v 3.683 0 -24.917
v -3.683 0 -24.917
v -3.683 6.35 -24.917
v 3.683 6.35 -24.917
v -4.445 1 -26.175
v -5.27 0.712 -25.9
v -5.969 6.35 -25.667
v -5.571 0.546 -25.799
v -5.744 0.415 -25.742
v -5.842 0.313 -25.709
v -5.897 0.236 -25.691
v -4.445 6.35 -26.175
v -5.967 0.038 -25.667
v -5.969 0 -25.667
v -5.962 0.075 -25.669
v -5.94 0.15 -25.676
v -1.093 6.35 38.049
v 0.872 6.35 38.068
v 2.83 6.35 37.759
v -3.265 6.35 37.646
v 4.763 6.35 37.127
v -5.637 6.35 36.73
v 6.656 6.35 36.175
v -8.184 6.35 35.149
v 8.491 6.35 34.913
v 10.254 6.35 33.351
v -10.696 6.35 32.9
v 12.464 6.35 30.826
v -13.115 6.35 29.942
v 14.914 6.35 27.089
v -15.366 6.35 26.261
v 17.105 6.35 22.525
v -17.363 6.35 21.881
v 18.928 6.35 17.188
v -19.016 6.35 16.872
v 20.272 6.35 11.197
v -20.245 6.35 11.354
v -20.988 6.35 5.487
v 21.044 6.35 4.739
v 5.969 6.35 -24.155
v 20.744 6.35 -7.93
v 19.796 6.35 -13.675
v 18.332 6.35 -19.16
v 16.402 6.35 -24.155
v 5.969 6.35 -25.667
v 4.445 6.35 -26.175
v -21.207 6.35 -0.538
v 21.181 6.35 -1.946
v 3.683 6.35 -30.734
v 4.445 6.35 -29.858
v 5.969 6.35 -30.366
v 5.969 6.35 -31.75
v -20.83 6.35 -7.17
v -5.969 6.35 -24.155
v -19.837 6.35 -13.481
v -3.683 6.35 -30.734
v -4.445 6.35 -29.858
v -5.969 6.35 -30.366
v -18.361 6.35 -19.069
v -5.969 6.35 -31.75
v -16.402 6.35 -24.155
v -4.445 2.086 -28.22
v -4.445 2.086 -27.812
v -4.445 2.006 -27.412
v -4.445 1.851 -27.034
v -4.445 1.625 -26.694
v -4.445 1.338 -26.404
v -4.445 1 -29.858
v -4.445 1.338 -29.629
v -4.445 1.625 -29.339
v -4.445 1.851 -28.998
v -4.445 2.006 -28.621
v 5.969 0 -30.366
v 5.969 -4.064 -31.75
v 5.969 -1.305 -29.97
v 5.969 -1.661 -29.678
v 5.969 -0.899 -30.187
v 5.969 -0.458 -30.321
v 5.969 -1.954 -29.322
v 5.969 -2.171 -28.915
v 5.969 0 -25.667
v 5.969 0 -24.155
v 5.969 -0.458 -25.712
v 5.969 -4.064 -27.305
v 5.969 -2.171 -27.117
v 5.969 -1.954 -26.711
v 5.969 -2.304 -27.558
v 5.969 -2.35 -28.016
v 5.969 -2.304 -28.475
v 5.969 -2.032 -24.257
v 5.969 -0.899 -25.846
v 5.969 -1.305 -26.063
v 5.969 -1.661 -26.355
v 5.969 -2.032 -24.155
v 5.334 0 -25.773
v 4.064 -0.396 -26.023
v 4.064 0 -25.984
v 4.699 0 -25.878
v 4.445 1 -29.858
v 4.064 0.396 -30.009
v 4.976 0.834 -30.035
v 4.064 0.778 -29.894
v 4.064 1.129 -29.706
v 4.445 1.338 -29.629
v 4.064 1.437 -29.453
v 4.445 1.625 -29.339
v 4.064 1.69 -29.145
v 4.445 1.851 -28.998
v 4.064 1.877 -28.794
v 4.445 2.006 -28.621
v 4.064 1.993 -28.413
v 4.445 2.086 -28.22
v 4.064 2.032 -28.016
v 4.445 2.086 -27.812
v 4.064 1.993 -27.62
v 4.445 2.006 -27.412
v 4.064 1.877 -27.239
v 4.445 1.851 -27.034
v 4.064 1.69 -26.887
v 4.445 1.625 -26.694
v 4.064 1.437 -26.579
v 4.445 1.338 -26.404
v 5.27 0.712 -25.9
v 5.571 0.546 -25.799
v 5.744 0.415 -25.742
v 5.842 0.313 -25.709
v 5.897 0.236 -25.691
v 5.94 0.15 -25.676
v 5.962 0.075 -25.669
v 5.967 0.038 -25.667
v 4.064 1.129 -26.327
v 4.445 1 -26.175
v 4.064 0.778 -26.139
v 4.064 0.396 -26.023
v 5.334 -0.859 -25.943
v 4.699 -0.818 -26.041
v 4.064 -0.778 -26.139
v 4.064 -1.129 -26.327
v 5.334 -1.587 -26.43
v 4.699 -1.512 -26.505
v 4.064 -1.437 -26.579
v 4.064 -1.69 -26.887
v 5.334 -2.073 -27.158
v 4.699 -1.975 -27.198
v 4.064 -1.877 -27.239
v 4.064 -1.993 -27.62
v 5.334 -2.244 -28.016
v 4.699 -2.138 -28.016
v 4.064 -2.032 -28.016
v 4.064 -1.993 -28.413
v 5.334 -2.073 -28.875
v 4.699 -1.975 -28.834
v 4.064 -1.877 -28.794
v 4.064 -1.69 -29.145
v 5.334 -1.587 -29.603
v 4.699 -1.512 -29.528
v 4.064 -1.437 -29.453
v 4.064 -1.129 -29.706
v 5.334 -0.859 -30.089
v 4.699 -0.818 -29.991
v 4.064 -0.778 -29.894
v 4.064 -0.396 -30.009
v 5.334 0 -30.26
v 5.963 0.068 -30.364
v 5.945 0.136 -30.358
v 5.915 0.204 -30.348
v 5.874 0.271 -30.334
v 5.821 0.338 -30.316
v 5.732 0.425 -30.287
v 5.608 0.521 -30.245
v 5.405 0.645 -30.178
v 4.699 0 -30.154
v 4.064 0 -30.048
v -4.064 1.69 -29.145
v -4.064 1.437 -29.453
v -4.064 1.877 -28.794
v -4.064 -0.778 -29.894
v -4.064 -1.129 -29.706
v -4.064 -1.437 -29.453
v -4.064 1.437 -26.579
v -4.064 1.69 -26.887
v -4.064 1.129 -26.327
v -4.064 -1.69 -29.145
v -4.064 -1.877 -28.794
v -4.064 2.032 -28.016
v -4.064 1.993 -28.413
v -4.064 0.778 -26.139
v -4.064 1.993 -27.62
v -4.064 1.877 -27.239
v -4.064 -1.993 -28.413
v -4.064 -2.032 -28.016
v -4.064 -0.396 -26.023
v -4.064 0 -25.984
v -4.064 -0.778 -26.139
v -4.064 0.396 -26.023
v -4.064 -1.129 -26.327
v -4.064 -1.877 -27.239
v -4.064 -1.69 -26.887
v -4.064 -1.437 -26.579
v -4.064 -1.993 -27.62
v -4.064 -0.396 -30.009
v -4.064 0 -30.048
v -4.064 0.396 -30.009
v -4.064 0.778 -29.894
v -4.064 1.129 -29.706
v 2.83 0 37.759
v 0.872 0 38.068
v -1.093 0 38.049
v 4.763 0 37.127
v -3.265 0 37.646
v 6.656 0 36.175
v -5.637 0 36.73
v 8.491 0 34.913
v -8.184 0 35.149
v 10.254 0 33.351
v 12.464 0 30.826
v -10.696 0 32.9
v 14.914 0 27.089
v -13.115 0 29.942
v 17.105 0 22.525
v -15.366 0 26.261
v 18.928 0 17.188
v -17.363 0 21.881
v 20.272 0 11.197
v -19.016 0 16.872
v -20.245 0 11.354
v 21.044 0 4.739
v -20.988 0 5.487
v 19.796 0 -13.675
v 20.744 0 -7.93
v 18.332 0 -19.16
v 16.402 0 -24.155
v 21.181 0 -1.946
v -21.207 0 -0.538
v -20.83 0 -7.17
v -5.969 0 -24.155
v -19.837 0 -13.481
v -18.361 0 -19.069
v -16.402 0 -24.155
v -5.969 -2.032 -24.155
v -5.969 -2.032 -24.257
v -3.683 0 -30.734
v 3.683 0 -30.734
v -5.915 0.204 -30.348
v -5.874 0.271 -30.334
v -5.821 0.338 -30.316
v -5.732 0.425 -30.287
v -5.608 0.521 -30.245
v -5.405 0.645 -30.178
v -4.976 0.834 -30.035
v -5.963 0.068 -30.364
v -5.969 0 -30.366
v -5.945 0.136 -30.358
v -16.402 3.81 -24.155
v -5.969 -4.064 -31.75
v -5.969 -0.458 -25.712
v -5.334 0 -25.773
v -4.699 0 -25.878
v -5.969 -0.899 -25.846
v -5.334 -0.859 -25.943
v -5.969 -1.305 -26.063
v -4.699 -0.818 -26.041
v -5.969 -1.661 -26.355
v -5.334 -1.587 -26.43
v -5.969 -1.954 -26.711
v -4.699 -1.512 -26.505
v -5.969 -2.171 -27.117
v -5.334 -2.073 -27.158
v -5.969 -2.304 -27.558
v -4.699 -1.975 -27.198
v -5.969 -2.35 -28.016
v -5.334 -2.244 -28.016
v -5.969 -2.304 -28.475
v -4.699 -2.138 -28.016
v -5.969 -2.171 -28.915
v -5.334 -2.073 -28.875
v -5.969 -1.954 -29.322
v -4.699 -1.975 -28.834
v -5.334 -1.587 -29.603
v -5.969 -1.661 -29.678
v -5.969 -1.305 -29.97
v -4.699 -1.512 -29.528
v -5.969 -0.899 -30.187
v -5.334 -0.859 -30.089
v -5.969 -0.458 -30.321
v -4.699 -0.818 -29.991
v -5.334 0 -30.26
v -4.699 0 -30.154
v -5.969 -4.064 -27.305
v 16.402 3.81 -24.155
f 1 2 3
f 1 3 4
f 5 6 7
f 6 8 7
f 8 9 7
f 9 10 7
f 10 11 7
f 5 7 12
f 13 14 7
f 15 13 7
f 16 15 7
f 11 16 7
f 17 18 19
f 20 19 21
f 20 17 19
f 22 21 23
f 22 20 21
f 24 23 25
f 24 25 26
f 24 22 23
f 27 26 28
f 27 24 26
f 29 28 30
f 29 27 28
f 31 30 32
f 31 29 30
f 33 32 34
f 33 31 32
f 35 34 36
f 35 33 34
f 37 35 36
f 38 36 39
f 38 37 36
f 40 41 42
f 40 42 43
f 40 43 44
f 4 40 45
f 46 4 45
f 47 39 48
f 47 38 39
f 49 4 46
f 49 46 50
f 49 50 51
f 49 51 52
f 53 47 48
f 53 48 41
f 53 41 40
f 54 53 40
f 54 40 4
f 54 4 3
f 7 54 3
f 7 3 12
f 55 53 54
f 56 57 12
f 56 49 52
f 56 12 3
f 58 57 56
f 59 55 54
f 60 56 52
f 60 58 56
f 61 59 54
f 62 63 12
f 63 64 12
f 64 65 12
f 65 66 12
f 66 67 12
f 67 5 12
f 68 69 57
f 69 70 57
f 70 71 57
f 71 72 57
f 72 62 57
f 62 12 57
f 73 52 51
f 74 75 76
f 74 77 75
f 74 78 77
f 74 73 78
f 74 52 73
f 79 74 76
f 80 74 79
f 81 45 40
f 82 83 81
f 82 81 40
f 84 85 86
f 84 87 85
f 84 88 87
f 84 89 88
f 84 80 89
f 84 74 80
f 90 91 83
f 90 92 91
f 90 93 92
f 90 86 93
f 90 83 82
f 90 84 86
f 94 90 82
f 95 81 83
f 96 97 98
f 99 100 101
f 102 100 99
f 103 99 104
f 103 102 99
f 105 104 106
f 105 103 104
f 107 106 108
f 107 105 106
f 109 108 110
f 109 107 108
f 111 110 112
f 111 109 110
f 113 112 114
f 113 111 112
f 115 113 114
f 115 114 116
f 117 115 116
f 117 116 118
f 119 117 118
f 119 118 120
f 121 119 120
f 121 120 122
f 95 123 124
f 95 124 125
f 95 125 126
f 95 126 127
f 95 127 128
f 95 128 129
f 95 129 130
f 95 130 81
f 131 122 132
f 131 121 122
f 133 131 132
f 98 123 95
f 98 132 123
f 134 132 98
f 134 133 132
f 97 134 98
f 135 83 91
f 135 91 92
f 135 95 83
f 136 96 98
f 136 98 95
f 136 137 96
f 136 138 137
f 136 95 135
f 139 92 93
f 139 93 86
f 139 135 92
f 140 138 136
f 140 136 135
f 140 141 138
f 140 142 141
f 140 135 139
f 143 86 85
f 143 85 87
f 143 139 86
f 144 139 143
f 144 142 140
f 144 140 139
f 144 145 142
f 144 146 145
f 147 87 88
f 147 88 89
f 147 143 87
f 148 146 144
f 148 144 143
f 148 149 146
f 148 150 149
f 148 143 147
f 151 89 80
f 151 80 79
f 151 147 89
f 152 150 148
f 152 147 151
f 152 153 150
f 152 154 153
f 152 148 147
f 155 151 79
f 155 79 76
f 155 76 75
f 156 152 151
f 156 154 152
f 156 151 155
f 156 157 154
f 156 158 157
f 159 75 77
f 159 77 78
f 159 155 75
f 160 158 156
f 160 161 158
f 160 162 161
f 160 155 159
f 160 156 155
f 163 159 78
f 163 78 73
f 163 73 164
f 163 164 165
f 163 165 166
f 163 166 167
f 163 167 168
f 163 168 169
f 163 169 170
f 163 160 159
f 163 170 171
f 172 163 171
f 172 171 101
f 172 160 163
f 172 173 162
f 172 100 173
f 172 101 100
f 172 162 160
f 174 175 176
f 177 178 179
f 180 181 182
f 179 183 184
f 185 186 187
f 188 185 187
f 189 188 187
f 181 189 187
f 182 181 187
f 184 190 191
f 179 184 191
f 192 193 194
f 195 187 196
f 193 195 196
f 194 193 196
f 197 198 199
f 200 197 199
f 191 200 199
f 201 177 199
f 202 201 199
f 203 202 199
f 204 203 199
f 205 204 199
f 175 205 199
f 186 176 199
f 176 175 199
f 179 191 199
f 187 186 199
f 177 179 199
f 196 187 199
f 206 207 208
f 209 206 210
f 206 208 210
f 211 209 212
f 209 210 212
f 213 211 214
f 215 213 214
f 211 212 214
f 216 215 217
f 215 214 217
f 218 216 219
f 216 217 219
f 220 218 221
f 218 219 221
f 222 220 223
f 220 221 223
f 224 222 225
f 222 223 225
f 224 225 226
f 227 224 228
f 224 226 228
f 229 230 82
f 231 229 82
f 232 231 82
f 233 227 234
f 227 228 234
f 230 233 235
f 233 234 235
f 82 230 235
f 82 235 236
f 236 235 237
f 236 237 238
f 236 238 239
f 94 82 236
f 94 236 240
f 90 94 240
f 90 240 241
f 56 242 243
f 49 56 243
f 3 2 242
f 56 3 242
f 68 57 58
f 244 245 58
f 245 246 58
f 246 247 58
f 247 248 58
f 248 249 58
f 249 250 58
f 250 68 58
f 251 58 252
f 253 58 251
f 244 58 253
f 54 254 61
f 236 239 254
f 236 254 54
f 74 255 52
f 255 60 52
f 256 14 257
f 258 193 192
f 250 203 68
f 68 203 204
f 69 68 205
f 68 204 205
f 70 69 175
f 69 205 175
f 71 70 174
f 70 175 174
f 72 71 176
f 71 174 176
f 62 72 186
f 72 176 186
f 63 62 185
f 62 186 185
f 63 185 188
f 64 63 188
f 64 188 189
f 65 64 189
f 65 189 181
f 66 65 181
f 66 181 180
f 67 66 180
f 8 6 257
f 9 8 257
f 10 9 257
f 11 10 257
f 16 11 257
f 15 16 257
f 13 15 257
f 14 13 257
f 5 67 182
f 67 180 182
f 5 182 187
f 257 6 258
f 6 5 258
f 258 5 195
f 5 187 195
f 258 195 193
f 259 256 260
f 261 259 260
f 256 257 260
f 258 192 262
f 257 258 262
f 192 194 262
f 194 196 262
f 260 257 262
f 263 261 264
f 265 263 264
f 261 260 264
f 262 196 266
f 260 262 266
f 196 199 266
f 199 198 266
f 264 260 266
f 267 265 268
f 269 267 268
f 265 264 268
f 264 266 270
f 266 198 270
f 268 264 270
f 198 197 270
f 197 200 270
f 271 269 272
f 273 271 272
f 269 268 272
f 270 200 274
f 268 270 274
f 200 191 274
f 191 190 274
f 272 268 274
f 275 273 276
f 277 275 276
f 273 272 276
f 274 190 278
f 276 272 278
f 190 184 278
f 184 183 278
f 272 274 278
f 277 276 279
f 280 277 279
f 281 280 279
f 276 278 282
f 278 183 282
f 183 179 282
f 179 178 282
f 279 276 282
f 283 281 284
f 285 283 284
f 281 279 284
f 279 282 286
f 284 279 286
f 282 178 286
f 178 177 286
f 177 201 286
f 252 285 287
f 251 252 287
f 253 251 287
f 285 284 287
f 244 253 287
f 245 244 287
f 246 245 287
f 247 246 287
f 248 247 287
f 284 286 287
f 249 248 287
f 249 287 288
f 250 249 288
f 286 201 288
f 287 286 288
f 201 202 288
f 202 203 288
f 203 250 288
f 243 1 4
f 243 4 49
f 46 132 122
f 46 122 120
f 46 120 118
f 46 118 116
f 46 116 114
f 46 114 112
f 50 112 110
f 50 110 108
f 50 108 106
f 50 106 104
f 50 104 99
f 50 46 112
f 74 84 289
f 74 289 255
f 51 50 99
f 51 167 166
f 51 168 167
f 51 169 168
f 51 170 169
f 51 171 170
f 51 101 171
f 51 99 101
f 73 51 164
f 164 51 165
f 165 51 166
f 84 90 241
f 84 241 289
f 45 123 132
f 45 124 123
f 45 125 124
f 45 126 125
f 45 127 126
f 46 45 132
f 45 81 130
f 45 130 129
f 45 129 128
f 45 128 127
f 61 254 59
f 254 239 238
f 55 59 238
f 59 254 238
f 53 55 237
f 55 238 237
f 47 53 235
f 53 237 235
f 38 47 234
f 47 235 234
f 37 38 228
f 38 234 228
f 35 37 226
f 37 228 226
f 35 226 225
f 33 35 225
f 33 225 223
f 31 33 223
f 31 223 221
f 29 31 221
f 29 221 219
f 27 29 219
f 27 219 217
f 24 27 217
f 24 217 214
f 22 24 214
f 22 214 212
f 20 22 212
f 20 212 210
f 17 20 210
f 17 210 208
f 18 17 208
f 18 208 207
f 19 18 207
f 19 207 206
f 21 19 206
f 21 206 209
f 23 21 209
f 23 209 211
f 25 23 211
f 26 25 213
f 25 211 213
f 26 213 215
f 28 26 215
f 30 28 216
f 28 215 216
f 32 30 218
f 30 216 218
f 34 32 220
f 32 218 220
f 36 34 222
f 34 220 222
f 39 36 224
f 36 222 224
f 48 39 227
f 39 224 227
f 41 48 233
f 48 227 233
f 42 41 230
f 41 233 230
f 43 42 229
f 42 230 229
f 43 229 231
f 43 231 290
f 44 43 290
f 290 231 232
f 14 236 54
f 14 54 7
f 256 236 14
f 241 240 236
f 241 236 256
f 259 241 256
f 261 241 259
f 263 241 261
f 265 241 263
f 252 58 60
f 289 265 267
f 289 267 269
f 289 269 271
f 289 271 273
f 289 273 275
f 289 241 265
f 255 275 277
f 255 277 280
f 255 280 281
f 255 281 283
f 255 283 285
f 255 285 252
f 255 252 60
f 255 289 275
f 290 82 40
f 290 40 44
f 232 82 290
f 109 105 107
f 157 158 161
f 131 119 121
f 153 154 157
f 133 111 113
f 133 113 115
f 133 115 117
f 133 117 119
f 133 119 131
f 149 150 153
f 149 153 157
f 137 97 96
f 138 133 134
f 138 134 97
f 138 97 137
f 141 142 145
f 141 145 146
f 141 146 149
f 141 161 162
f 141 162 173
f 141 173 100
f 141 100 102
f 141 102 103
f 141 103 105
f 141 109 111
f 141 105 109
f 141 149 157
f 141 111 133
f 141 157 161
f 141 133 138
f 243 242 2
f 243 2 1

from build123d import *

# Parameters (mm, degrees)
SKETCH1_RX          = 38.1
SKETCH1_RY          = 21.209
BOSS_EXTRUDE1_DEPTH = 6.35
CUT_EXTRUDE6_DEPTH  = 45.065339906
CUT_EXTRUDE8_DEPTH  = 3.81
BOSS_EXTRUDE2_DEPTH = 11.938
CUT_EXTRUDE11_DEPTH = 45.310625914
CUT_EXTRUDE10_DEPTH = 6.35
CUT_EXTRUDE14_START = -6.35
SKETCH16_W          = 7.366
SKETCH16_H          = 5.8166
CUT_EXTRUDE14_DEPTH = 6.35


with BuildPart() as part:
    # Sketch1 → Boss-Extrude1 (new body)
    with BuildSketch(Plane(origin=(0, 0, 0), x_dir=(1, 0, 0), z_dir=(0, 1, 0))):
        with Locations(Location((0, 0), (0, 0, 90))):
            Ellipse(SKETCH1_RX, SKETCH1_RY)
    extrude(amount=BOSS_EXTRUDE1_DEPTH)

    # Sketch7 → Cut-Extrude6 (cut, through all)
    with BuildSketch(Plane(origin=(0, 6.35, 0), x_dir=(1, 0, 0), z_dir=(0, 1, 0))):
        with BuildLine():
            Line((-11.723715863, 31.75), (11.723715863, 31.75))
            add(Edge.make_bspline(
                [(11.723715863, 31.75), (0, 45.72), (-11.723715863, 31.75)],
                knots=[5.697499764, 5.697499764, 5.697499764, 6.868870851, 6.868870851, 6.868870851], degree=2, weights=[1, 0.833333333, 1]))
        make_face()
    extrude(amount=-CUT_EXTRUDE6_DEPTH, mode=Mode.SUBTRACT)

    # Sketch8 → Cut-Extrude8 (cut)
    with BuildSketch(Plane.XZ):
        Polygon((5.969, -31.75), (5.969, -24.1554), (25.250257638, -24.1554), (25.250257638, -46.762779547), (-25.868253854, -46.762779547), (-25.868253854, -24.1554), (-5.969, -24.1554), (-5.969, -31.75), align=None)
    extrude(amount=-CUT_EXTRUDE8_DEPTH, mode=Mode.SUBTRACT)

    # Sketch9 → Boss-Extrude2 (add)
    with BuildSketch(Plane(origin=(5.969, 0, 0), x_dir=(0, 0, -1), z_dir=(1, 0, 0))):
        Polygon((24.1554, 3.81), (24.1554, -2.032), (24.257, -2.032), (27.305, -4.064), (31.75, -4.064), (31.75, 3.81), align=None)
    extrude(amount=-BOSS_EXTRUDE2_DEPTH)

    # Sketch10 → Cut-Revolve1 (revolve, cut)
    with BuildSketch(Plane(origin=(5.969, 0, 0), x_dir=(0, 0, -1), z_dir=(1, 0, 0))):
        with BuildLine():
            Line((28.0162, -0.635), (28.0162, 0.635))
            ThreePointArc((28.0162, 0.635), (28.6512, 0), (28.0162, -0.635))
        make_face()
    cut_revolve1 = revolve(axis=Axis((5.969, -0.635, -28.0162), (0, 1, 0)), mode=Mode.SUBTRACT)

    # Sketch14 → Cut-Revolve2 (revolve, cut)
    with BuildSketch(Plane(origin=(0, 0, 0), x_dir=(-1, 0, 0), z_dir=(0, -1, 0))):
        Polygon((-5.969, 25.6667), (-4.064, 25.9842), (-4.064, 28.0162), (-5.969, 28.0162), align=None)
    cut_revolve2 = revolve(axis=Axis((-0.604514271, 0, -28.0162), (1, 0, 0)), mode=Mode.SUBTRACT)

    # Sketch13 → Cut-Extrude11 (cut, through all)
    with BuildSketch(Plane.XZ.offset(-3.81)):
        with BuildLine():
            Line((16.401620572, -24.1554), (5.969, -24.1554))
            Line((5.969, -24.1554), (5.969, -31.75))
            Line((5.969, -31.75), (11.723715863, -31.75))
            add(Edge.make_bspline(
                [(11.723715863, -31.75), (14.380408678, -28.584280269), (16.401620572, -24.1554)],
                knots=[0.585685543, 0.585685543, 0.585685543, 0.884081597, 0.884081597, 0.884081597], degree=2, weights=[1, 0.988890605, 1]))
        make_face()
        with BuildLine():
            Line((-11.723715863, -31.75), (-5.969, -31.75))
            Line((-5.969, -31.75), (-5.969, -24.1554))
            Line((-5.969, -24.1554), (-16.401620572, -24.1554))
            add(Edge.make_bspline(
                [(-16.401620572, -24.1554), (-14.380408678, -28.584280269), (-11.723715863, -31.75)],
                knots=[5.39910371, 5.39910371, 5.39910371, 5.697499764, 5.697499764, 5.697499764], degree=2, weights=[1, 0.988890605, 1]))
        make_face()
    extrude(amount=-CUT_EXTRUDE11_DEPTH, mode=Mode.SUBTRACT)

    # Sketch12 → Cut-Extrude10 (cut)
    with BuildSketch(Plane(origin=(0, 6.35, -25.4), x_dir=(-1, 0, 0), z_dir=(0, -1, 0))):
        Polygon((-5.969, 0.2667), (-4.445, 0.7747), (-4.445, 4.4577), (-5.969, 4.9657), align=None)
    cut_extrude10 = extrude(amount=CUT_EXTRUDE10_DEPTH, mode=Mode.SUBTRACT)

    # Mirror1: Cut-Revolve1, Cut-Revolve2, Cut-Extrude10 across plane
    add(cut_revolve1.mirror(Plane(origin=(0, 0, 0), x_dir=(0, 0, 1), z_dir=(1, 0, 0))), mode=Mode.SUBTRACT)
    add(cut_revolve2.mirror(Plane(origin=(0, 0, 0), x_dir=(0, 0, 1), z_dir=(1, 0, 0))), mode=Mode.SUBTRACT)
    add(cut_extrude10.mirror(Plane(origin=(0, 0, 0), x_dir=(0, 0, 1), z_dir=(1, 0, 0))), mode=Mode.SUBTRACT)

    # Sketch16 → Cut-Extrude14 (cut)
    with BuildSketch(Plane(origin=(0, 6.35, 0), x_dir=(1, 0, 0), z_dir=(0, 1, 0)).offset(CUT_EXTRUDE14_START)):
        with Locations((0, 27.8257)):
            Rectangle(SKETCH16_W, SKETCH16_H)
    extrude(amount=CUT_EXTRUDE14_DEPTH, mode=Mode.SUBTRACT)


solid = part.part
